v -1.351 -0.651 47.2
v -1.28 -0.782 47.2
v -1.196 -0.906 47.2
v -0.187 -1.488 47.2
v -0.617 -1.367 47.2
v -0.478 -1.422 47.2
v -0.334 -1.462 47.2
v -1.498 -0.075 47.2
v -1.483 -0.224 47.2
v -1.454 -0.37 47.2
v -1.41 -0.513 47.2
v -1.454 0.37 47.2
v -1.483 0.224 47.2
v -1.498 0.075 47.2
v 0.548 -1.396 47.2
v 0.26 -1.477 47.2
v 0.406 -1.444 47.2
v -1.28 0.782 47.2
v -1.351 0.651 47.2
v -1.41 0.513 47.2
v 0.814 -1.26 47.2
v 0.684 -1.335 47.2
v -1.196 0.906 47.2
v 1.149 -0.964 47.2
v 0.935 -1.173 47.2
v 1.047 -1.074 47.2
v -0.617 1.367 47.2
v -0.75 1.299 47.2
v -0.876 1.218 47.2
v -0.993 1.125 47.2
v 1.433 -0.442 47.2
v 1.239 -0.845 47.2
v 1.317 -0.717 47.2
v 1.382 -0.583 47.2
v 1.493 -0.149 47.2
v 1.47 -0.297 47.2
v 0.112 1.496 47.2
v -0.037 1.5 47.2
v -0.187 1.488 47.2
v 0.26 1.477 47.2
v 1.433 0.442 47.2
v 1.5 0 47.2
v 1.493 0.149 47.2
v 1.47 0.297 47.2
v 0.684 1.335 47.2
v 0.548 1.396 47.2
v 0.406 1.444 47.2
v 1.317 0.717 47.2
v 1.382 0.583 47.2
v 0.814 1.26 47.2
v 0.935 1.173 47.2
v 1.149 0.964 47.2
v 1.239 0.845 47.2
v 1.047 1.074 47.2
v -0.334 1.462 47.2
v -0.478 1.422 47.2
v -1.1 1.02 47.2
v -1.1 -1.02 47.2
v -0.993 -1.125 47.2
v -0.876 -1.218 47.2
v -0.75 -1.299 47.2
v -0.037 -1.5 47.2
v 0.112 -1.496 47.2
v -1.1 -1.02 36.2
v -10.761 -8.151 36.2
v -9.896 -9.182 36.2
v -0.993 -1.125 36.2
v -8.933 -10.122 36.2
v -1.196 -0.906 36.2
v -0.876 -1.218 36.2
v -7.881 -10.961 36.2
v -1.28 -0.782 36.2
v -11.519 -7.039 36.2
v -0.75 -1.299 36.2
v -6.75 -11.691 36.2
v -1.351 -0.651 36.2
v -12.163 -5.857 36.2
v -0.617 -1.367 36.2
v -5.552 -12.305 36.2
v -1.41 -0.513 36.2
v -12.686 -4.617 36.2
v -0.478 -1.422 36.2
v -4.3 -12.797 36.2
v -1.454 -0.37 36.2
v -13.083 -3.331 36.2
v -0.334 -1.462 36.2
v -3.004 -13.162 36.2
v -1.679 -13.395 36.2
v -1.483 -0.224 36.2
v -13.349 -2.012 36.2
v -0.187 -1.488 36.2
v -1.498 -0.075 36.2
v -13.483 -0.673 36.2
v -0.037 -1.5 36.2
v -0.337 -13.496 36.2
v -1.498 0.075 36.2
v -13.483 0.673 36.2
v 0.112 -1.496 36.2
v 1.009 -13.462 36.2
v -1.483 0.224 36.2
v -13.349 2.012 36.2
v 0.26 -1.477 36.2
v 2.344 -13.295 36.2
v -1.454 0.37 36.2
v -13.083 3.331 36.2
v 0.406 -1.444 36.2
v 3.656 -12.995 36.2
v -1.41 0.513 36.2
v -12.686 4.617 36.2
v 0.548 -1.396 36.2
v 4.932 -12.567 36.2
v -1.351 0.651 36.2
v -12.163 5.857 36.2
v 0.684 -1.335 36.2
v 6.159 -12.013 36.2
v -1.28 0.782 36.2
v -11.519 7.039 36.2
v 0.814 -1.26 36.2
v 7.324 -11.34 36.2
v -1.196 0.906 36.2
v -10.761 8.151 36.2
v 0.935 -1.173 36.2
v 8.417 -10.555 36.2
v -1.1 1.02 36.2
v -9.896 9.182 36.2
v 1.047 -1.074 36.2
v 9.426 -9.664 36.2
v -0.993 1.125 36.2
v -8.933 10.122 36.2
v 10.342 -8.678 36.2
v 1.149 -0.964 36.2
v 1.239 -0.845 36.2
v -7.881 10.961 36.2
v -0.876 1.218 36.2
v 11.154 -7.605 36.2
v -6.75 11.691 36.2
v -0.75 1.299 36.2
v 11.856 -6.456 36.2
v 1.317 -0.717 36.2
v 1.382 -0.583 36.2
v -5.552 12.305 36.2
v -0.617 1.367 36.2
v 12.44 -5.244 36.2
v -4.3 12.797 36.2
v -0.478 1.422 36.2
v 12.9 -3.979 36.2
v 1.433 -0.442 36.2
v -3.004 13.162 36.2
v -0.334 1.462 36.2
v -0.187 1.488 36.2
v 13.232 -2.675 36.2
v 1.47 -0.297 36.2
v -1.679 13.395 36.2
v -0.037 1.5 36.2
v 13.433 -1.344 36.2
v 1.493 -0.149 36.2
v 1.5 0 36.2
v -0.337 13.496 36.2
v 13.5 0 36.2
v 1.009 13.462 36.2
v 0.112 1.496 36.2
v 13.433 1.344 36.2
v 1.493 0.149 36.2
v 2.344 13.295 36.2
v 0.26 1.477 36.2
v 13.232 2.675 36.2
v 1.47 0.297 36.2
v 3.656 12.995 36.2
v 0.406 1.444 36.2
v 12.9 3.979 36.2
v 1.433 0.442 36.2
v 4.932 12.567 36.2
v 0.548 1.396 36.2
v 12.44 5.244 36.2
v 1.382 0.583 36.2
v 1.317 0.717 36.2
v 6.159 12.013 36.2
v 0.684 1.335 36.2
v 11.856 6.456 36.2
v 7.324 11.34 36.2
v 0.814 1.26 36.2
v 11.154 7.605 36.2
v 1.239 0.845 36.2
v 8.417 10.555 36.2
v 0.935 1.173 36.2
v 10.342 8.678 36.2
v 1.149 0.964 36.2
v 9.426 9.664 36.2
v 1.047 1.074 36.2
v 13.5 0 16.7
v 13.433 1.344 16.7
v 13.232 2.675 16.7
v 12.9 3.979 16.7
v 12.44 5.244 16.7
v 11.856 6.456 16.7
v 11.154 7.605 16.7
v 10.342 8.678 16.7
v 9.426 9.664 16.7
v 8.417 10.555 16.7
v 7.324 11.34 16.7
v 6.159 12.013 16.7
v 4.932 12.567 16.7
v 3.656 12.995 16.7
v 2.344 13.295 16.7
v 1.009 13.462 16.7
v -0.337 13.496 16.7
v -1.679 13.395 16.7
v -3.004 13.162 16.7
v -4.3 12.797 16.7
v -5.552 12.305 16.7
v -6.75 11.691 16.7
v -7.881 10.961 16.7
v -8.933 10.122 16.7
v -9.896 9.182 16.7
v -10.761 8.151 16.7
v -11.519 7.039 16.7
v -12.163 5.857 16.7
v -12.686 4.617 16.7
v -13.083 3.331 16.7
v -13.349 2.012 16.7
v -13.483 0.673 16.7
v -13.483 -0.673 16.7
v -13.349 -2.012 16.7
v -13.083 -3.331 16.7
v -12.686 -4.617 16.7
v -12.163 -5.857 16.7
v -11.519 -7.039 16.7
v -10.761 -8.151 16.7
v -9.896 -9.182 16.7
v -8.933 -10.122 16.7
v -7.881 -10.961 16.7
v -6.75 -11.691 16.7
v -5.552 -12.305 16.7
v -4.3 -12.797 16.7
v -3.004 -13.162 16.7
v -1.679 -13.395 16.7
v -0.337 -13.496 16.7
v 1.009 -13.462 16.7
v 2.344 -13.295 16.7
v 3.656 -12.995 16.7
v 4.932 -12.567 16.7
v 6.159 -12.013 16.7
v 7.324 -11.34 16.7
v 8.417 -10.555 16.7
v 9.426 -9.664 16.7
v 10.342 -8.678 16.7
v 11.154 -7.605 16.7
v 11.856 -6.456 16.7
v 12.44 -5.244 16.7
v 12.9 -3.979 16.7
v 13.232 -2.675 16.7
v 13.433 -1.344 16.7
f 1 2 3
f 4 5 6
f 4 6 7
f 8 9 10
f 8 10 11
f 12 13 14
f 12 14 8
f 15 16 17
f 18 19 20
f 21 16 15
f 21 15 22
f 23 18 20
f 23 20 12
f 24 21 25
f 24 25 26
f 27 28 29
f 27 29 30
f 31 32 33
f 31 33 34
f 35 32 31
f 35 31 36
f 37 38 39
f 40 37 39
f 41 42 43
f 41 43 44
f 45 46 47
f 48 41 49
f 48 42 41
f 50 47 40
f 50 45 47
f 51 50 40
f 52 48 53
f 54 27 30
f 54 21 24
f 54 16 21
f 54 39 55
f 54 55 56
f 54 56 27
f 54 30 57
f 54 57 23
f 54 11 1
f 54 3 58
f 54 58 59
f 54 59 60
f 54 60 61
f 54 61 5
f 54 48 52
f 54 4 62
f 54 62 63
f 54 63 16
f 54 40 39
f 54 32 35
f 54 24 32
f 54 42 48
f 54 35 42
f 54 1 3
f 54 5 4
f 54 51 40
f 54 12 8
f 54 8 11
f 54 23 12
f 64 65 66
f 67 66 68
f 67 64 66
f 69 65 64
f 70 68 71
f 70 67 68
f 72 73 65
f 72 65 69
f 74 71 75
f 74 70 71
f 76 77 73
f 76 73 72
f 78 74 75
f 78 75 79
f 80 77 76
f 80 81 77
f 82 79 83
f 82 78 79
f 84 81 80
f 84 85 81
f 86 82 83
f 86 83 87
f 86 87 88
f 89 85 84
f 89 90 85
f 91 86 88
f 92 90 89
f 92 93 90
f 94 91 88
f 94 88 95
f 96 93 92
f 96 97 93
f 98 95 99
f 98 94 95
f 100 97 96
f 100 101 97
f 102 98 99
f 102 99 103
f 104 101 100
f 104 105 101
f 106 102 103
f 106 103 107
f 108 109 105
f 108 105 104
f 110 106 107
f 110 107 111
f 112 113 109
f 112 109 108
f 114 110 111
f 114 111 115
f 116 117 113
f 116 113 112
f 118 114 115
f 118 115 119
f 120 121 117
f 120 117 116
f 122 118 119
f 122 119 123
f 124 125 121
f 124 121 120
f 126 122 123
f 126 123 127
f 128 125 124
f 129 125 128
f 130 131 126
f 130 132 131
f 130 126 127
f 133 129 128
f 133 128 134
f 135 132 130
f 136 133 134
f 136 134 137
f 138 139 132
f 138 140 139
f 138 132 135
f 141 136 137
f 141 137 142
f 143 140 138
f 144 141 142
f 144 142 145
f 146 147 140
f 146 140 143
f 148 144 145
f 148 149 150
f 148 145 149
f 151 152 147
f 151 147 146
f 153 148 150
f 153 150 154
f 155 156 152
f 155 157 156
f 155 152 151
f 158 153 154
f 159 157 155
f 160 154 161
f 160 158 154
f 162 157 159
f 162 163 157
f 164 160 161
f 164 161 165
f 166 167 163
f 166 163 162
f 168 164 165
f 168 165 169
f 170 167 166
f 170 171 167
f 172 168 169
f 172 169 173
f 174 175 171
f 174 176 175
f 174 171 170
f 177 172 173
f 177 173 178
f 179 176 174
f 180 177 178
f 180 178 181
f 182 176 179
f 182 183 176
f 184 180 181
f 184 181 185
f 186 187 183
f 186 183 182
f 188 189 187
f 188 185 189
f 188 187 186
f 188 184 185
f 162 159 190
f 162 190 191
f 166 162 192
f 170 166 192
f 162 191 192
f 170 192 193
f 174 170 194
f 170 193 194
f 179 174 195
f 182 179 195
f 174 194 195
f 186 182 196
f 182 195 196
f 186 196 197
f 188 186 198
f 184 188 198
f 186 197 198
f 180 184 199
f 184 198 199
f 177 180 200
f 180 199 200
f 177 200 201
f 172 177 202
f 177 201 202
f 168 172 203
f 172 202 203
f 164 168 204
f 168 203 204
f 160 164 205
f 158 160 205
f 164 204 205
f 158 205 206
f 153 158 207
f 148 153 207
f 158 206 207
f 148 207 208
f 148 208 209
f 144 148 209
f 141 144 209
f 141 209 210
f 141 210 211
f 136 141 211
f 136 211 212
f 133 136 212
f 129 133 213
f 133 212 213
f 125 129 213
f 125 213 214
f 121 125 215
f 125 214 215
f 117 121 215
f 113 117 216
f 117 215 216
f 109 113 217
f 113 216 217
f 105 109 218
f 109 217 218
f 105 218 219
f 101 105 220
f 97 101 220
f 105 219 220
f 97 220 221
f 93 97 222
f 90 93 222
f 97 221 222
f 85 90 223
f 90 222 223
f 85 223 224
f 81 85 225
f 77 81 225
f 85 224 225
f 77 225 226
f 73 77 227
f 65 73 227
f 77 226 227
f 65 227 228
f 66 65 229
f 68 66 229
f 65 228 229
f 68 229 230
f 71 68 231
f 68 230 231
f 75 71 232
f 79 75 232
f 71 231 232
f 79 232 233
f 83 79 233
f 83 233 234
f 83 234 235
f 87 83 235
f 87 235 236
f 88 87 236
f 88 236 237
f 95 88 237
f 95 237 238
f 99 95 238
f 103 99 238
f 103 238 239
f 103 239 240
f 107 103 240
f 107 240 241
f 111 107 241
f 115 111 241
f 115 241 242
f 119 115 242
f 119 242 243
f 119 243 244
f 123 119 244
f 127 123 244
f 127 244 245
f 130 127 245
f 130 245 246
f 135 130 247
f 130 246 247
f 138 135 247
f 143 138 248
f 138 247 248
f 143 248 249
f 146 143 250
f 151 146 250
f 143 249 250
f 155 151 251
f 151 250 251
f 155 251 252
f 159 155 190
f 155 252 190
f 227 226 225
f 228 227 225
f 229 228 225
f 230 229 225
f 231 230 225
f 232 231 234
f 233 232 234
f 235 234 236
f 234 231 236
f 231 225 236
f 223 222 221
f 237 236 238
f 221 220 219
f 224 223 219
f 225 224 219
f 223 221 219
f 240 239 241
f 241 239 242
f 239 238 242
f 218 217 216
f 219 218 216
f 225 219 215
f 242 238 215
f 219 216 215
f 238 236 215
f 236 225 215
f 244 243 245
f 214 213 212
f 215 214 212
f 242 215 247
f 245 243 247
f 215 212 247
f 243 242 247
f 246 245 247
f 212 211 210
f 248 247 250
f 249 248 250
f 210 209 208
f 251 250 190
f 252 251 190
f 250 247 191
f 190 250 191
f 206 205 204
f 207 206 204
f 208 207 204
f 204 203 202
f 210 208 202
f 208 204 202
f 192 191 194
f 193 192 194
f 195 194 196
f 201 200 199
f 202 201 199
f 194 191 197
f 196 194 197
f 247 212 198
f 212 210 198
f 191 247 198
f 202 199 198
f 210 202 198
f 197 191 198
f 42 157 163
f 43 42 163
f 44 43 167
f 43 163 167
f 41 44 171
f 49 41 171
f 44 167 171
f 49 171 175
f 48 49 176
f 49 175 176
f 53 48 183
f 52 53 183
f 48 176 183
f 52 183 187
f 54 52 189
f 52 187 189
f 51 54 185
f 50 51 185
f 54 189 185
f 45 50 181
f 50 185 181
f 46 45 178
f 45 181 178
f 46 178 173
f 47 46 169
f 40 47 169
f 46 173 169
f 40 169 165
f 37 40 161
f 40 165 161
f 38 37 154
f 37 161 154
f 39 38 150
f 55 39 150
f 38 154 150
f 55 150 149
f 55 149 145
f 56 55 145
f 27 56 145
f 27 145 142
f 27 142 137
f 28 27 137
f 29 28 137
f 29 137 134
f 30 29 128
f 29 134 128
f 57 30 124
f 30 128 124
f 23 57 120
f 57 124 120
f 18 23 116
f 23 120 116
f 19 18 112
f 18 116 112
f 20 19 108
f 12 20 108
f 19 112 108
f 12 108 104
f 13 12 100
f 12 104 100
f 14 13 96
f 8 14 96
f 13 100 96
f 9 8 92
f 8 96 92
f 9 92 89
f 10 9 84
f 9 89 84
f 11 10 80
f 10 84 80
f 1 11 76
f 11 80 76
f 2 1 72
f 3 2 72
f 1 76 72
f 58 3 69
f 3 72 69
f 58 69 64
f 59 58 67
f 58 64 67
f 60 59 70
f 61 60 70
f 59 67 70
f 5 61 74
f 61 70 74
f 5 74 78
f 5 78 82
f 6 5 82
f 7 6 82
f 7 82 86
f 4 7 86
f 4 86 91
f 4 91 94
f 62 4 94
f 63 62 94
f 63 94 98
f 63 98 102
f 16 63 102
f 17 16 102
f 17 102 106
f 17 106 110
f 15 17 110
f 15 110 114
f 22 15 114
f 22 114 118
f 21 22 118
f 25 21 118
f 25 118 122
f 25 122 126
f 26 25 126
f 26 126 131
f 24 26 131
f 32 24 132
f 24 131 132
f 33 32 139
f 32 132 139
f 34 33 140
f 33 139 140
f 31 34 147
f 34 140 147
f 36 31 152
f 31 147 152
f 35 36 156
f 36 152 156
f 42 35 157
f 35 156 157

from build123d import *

# Parameters (mm, degrees)
CYLINDER063_R     = 1.5
CYLINDER063_DEPTH = 11
CYLINDER062_R     = 13.5
CYLINDER062_DEPTH = 19.5


with BuildPart() as servo_pot_shaft:
    # Cylinder063 → Cylinder063 (new body)
    with BuildSketch(Plane.XY.offset(19.5)):
        Circle(CYLINDER063_R)
    extrude(amount=CYLINDER063_DEPTH)


with BuildPart() as servo_pot:
    # Cylinder062 → Cylinder062 (new body)
    with BuildSketch(Plane.XY):
        Circle(CYLINDER062_R)
    extrude(amount=CYLINDER062_DEPTH)

    # Fusion027: union servo-pot-shaft
    add(servo_pot_shaft.part)


with BuildPart() as servo_pot_1:
    # Fusion027 placement: moved
    add(servo_pot.part.moved(Location((0, 0, 16.7))))


solid = servo_pot_1.part
